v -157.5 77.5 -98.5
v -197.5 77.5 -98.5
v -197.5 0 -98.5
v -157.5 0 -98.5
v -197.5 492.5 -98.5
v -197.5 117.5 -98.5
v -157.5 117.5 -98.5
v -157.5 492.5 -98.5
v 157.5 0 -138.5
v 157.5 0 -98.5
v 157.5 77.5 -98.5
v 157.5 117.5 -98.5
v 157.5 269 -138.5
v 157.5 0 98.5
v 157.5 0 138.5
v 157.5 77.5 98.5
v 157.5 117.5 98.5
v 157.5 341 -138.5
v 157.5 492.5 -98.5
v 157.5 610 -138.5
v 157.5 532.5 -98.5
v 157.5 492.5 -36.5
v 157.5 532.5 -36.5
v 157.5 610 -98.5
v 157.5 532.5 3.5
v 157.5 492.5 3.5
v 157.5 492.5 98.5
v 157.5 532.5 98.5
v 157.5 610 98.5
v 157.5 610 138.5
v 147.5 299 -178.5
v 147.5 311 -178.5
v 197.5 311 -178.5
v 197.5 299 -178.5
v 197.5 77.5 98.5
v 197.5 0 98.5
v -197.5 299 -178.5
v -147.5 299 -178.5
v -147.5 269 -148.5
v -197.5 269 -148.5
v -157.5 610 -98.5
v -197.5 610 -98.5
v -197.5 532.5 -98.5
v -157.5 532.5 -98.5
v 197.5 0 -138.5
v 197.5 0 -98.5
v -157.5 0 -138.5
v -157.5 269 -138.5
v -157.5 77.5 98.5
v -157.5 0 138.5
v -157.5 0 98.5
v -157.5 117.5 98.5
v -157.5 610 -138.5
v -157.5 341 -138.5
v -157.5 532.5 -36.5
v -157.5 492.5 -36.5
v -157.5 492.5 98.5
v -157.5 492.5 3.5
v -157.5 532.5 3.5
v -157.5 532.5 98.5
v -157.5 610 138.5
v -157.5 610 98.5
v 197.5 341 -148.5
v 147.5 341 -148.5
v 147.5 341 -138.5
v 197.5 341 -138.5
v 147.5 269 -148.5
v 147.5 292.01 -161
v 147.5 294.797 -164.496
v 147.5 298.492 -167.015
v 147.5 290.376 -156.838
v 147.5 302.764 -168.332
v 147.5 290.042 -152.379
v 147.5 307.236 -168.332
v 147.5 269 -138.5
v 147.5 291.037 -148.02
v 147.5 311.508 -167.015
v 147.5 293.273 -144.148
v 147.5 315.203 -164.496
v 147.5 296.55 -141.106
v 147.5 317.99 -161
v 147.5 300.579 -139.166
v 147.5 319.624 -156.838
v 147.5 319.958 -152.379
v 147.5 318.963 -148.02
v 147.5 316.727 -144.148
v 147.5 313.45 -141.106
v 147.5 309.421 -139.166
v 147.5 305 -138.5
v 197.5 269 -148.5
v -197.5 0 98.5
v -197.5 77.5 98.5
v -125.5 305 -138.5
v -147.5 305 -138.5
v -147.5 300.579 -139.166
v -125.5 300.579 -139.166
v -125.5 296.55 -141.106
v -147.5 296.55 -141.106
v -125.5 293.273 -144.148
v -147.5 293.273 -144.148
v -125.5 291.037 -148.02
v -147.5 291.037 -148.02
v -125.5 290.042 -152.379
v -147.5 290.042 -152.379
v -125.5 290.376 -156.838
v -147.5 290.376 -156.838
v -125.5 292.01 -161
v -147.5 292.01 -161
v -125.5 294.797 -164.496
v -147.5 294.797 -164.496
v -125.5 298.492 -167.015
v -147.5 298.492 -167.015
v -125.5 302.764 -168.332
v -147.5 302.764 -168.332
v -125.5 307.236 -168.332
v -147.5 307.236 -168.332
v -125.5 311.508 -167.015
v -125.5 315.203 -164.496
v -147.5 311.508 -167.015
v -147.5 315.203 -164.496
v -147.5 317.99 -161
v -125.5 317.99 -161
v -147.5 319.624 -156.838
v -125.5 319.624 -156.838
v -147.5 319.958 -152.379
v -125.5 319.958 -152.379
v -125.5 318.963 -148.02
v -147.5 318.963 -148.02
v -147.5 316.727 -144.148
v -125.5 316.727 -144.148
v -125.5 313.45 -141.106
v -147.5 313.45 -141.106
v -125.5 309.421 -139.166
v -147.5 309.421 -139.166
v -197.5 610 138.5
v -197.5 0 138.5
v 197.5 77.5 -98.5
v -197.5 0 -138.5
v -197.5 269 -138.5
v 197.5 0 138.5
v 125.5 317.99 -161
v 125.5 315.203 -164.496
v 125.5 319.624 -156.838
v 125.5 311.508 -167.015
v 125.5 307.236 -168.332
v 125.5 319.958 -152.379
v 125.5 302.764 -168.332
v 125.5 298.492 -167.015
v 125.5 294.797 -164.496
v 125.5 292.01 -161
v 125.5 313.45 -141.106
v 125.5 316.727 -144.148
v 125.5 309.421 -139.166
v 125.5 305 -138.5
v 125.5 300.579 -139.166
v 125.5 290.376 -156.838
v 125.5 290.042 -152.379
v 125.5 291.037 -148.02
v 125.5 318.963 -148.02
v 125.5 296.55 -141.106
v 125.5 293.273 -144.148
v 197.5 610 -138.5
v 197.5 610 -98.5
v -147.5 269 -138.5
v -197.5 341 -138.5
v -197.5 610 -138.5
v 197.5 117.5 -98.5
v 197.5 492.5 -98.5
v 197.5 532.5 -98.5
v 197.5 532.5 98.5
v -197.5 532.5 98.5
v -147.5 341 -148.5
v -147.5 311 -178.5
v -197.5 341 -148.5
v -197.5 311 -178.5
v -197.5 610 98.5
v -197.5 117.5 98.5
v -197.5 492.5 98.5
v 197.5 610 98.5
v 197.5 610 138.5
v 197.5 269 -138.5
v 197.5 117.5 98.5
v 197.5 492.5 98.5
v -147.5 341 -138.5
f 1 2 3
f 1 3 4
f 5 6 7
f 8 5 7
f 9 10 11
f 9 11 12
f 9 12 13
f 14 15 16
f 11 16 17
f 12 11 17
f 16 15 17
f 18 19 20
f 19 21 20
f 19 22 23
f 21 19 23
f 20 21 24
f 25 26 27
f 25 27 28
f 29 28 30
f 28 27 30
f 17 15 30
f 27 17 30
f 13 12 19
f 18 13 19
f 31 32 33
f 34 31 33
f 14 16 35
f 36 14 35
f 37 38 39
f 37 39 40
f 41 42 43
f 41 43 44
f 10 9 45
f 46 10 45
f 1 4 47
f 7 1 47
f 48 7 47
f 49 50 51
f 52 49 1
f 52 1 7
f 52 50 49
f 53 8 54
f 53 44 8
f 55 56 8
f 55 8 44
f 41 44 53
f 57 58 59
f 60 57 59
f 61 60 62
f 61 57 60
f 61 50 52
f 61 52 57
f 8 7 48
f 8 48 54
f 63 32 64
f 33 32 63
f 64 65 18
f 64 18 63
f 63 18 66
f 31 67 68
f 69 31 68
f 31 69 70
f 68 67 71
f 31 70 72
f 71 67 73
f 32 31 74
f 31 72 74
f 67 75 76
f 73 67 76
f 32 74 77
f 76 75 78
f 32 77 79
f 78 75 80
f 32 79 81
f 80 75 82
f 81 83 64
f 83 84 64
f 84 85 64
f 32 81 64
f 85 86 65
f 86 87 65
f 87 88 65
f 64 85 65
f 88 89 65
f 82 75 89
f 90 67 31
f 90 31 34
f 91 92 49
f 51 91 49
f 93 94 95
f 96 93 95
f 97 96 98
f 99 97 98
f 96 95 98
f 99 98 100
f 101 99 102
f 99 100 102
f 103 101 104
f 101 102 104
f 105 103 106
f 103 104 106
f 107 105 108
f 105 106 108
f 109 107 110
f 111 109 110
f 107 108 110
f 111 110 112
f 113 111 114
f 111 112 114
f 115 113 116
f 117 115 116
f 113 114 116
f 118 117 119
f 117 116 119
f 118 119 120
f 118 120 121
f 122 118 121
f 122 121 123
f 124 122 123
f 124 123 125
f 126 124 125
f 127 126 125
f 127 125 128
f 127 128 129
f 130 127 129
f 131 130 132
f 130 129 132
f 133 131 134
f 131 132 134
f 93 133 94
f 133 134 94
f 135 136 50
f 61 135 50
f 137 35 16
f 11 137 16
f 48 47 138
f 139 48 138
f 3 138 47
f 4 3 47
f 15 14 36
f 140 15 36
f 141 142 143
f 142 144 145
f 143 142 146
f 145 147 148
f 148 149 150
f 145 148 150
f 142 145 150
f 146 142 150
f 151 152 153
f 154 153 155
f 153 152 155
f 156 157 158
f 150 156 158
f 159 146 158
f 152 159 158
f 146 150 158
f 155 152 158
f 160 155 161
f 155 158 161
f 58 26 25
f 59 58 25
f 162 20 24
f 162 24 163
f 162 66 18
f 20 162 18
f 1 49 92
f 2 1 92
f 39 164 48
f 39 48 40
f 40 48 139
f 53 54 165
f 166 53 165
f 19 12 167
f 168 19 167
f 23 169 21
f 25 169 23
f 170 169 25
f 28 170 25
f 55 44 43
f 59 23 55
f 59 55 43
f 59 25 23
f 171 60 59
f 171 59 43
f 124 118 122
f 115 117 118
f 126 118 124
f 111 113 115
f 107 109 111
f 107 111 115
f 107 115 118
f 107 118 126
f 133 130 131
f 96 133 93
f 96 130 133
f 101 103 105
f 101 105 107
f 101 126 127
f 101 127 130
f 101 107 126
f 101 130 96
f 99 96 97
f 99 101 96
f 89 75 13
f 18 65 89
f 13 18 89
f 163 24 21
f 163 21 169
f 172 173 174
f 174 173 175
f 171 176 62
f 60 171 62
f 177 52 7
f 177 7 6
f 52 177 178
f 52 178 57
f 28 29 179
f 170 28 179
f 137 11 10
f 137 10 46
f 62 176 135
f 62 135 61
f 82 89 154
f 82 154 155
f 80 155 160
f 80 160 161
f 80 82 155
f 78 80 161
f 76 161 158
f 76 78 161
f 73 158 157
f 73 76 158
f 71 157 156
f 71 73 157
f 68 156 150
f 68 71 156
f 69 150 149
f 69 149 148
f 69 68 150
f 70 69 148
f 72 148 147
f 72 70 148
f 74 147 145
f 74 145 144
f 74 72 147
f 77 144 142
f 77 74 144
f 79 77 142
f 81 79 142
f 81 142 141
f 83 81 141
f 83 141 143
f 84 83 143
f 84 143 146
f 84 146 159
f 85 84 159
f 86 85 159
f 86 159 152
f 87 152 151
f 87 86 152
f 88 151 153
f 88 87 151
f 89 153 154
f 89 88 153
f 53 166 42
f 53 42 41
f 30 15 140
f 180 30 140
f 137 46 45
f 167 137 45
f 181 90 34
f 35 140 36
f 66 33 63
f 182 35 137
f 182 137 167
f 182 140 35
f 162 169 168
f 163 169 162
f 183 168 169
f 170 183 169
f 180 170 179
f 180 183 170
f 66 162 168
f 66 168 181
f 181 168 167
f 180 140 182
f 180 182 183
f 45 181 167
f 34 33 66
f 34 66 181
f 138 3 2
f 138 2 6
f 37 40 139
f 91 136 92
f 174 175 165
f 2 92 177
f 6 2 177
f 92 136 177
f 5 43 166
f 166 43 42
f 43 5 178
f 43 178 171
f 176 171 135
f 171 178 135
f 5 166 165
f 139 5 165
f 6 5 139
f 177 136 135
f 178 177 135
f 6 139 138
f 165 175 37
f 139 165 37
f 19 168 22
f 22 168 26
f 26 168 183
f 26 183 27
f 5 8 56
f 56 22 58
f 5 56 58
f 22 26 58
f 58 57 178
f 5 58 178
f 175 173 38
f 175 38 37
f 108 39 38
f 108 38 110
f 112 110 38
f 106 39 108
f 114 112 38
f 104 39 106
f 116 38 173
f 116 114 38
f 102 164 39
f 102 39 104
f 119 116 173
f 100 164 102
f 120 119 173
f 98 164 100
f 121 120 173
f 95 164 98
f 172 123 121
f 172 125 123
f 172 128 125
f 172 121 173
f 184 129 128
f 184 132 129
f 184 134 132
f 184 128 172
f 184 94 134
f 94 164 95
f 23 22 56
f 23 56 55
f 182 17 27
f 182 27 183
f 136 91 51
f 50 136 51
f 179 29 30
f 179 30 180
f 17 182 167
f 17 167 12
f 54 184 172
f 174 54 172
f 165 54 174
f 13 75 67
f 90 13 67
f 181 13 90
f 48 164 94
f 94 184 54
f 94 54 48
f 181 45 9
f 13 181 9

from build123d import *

# Parameters (mm, degrees)
SKETCH1_W                = 40
SKETCH1_H                = 40
BOSS_EXTRUDE1_DEPTH      = 610
BOSS_EXTRUDE1_2_DEPTH    = 610
BOSS_EXTRUDE1_3_DEPTH    = 610
BOSS_EXTRUDE1_4_DEPTH    = 610
SKETCH2_W                = 40
SKETCH2_H                = 40
BOSS_EXTRUDE2_DEPTH      = 237
BOSS_EXTRUDE3_REACH      = 721.241
SKETCH3_W                = 40
SKETCH3_H                = 40
SKETCH4_W                = 50
SKETCH4_H                = 72
BOSS_EXTRUDE4_DEPTH      = 40
CHAMFER1_SIZE            = 30
SKETCH5_R                = 15
BOSS_EXTRUDE5_DEPTH      = 22
CHAMFER1_OF_MIRROR1_SIZE = 30


with BuildPart() as part:
    # Sketch1 → Boss-Extrude1 (new body)
    with BuildSketch(Plane(origin=(0, 0, 0), x_dir=(1, 0, 0), z_dir=(0, 1, 0))):
        with Locations((-177.5, 118.5)):
            Rectangle(SKETCH1_W, SKETCH1_H)
    extrude(amount=BOSS_EXTRUDE1_DEPTH)



with BuildPart() as body_2:
    # Sketch1 → Boss-Extrude1 2 (new body)
    with BuildSketch(Plane(origin=(0, 0, 0), x_dir=(1, 0, 0), z_dir=(0, 1, 0))):
        with Locations((177.5, 118.5)):
            Rectangle(SKETCH1_W, SKETCH1_H)
    extrude(amount=BOSS_EXTRUDE1_2_DEPTH)


with BuildPart() as body_3:
    # Sketch1 → Boss-Extrude1 3 (new body)
    with BuildSketch(Plane(origin=(0, 0, 0), x_dir=(1, 0, 0), z_dir=(0, 1, 0))):
        with Locations((177.5, -118.5)):
            Rectangle(SKETCH1_W, SKETCH1_H)
    extrude(amount=BOSS_EXTRUDE1_3_DEPTH)


with BuildPart() as body_4:
    # Sketch1 → Boss-Extrude1 4 (new body)
    with BuildSketch(Plane(origin=(0, 0, 0), x_dir=(1, 0, 0), z_dir=(0, 1, 0))):
        with Locations((-177.5, -118.5)):
            Rectangle(SKETCH1_W, SKETCH1_H)
    extrude(amount=BOSS_EXTRUDE1_4_DEPTH)


with BuildPart() as part_1:
    add(part.part)

    add(body_2.part)  # Boss-Extrude2 merges body 2

    add(body_3.part)  # Boss-Extrude2 merges body 3

    add(body_4.part)  # Boss-Extrude2 merges body 4
    # Sketch2 → Boss-Extrude2 (add)
    with BuildSketch(Plane(origin=(0, 0, 98.5), x_dir=(-1, 0, 0), z_dir=(0, 0, -1))):
        with Locations((177.5, 97.5)):
            Rectangle(SKETCH2_W, SKETCH2_H)
        with Locations((-177.5, 97.5)):
            Rectangle(SKETCH2_W, SKETCH2_H)
        with Locations((-177.5, 512.5)):
            Rectangle(SKETCH2_W, SKETCH2_H)
        with Locations((177.5, 512.5)):
            Rectangle(SKETCH2_W, SKETCH2_H)
    extrude(amount=BOSS_EXTRUDE2_DEPTH)

    # Sketch3 → Boss-Extrude3 (add, up to next)
    with BuildSketch(Plane(origin=(-157.5, 0, 0), x_dir=(0, 0, -1), z_dir=(1, 0, 0)), mode=Mode.PRIVATE) as boss_extrude3_sk1:
        with Locations((16.5, 512.5)):
            Rectangle(SKETCH3_W, SKETCH3_H)
    boss_extrude3_tool1 = extrude(boss_extrude3_sk1.sketch, amount=BOSS_EXTRUDE3_REACH, mode=Mode.PRIVATE) - part_1.part
    add(boss_extrude3_tool1.solids().sort_by_distance((-157.5, 512.5, -16.5))[0])

    # Sketch4 → Boss-Extrude4 (add)
    with BuildSketch(Plane(origin=(0, 0, -138.5), x_dir=(-1, 0, 0), z_dir=(0, 0, -1))):
        with Locations((172.5, 305)):
            Rectangle(SKETCH4_W, SKETCH4_H)
    boss_extrude4 = extrude(amount=BOSS_EXTRUDE4_DEPTH)

    # Chamfer1
    chamfer1_edges = [part_1.edges().sort_by_distance(p)[0] for p in [
        (-172.5, 341, -178.5),
        (-172.5, 269, -178.5),
    ]]
    chamfer(chamfer1_edges, length=CHAMFER1_SIZE)

    # Sketch5 → Boss-Extrude5 (add)
    with BuildSketch(Plane(origin=(-147.5, 0, 0), x_dir=(0, 0, -1), z_dir=(1, 0, 0))):
        with Locations(Location((153.5, 305, 0), (0, 0, 180))):
            Circle(SKETCH5_R)
    boss_extrude5 = extrude(amount=BOSS_EXTRUDE5_DEPTH)

    # Mirror1: Boss-Extrude4, Boss-Extrude5 across plane
    add(boss_extrude4.mirror(Plane(origin=(0, 0, 0), x_dir=(0, 0, 1), z_dir=(1, 0, 0))))
    add(boss_extrude5.mirror(Plane(origin=(0, 0, 0), x_dir=(0, 0, 1), z_dir=(1, 0, 0))))

    # Chamfer1 of Mirror1
    chamfer1_of_mirror1_edges = [part_1.edges().sort_by_distance(p)[0] for p in [
        (172.5, 341, -178.5),
        (172.5, 269, -178.5),
    ]]
    chamfer(chamfer1_of_mirror1_edges, length=CHAMFER1_OF_MIRROR1_SIZE)


solid = part_1.part
